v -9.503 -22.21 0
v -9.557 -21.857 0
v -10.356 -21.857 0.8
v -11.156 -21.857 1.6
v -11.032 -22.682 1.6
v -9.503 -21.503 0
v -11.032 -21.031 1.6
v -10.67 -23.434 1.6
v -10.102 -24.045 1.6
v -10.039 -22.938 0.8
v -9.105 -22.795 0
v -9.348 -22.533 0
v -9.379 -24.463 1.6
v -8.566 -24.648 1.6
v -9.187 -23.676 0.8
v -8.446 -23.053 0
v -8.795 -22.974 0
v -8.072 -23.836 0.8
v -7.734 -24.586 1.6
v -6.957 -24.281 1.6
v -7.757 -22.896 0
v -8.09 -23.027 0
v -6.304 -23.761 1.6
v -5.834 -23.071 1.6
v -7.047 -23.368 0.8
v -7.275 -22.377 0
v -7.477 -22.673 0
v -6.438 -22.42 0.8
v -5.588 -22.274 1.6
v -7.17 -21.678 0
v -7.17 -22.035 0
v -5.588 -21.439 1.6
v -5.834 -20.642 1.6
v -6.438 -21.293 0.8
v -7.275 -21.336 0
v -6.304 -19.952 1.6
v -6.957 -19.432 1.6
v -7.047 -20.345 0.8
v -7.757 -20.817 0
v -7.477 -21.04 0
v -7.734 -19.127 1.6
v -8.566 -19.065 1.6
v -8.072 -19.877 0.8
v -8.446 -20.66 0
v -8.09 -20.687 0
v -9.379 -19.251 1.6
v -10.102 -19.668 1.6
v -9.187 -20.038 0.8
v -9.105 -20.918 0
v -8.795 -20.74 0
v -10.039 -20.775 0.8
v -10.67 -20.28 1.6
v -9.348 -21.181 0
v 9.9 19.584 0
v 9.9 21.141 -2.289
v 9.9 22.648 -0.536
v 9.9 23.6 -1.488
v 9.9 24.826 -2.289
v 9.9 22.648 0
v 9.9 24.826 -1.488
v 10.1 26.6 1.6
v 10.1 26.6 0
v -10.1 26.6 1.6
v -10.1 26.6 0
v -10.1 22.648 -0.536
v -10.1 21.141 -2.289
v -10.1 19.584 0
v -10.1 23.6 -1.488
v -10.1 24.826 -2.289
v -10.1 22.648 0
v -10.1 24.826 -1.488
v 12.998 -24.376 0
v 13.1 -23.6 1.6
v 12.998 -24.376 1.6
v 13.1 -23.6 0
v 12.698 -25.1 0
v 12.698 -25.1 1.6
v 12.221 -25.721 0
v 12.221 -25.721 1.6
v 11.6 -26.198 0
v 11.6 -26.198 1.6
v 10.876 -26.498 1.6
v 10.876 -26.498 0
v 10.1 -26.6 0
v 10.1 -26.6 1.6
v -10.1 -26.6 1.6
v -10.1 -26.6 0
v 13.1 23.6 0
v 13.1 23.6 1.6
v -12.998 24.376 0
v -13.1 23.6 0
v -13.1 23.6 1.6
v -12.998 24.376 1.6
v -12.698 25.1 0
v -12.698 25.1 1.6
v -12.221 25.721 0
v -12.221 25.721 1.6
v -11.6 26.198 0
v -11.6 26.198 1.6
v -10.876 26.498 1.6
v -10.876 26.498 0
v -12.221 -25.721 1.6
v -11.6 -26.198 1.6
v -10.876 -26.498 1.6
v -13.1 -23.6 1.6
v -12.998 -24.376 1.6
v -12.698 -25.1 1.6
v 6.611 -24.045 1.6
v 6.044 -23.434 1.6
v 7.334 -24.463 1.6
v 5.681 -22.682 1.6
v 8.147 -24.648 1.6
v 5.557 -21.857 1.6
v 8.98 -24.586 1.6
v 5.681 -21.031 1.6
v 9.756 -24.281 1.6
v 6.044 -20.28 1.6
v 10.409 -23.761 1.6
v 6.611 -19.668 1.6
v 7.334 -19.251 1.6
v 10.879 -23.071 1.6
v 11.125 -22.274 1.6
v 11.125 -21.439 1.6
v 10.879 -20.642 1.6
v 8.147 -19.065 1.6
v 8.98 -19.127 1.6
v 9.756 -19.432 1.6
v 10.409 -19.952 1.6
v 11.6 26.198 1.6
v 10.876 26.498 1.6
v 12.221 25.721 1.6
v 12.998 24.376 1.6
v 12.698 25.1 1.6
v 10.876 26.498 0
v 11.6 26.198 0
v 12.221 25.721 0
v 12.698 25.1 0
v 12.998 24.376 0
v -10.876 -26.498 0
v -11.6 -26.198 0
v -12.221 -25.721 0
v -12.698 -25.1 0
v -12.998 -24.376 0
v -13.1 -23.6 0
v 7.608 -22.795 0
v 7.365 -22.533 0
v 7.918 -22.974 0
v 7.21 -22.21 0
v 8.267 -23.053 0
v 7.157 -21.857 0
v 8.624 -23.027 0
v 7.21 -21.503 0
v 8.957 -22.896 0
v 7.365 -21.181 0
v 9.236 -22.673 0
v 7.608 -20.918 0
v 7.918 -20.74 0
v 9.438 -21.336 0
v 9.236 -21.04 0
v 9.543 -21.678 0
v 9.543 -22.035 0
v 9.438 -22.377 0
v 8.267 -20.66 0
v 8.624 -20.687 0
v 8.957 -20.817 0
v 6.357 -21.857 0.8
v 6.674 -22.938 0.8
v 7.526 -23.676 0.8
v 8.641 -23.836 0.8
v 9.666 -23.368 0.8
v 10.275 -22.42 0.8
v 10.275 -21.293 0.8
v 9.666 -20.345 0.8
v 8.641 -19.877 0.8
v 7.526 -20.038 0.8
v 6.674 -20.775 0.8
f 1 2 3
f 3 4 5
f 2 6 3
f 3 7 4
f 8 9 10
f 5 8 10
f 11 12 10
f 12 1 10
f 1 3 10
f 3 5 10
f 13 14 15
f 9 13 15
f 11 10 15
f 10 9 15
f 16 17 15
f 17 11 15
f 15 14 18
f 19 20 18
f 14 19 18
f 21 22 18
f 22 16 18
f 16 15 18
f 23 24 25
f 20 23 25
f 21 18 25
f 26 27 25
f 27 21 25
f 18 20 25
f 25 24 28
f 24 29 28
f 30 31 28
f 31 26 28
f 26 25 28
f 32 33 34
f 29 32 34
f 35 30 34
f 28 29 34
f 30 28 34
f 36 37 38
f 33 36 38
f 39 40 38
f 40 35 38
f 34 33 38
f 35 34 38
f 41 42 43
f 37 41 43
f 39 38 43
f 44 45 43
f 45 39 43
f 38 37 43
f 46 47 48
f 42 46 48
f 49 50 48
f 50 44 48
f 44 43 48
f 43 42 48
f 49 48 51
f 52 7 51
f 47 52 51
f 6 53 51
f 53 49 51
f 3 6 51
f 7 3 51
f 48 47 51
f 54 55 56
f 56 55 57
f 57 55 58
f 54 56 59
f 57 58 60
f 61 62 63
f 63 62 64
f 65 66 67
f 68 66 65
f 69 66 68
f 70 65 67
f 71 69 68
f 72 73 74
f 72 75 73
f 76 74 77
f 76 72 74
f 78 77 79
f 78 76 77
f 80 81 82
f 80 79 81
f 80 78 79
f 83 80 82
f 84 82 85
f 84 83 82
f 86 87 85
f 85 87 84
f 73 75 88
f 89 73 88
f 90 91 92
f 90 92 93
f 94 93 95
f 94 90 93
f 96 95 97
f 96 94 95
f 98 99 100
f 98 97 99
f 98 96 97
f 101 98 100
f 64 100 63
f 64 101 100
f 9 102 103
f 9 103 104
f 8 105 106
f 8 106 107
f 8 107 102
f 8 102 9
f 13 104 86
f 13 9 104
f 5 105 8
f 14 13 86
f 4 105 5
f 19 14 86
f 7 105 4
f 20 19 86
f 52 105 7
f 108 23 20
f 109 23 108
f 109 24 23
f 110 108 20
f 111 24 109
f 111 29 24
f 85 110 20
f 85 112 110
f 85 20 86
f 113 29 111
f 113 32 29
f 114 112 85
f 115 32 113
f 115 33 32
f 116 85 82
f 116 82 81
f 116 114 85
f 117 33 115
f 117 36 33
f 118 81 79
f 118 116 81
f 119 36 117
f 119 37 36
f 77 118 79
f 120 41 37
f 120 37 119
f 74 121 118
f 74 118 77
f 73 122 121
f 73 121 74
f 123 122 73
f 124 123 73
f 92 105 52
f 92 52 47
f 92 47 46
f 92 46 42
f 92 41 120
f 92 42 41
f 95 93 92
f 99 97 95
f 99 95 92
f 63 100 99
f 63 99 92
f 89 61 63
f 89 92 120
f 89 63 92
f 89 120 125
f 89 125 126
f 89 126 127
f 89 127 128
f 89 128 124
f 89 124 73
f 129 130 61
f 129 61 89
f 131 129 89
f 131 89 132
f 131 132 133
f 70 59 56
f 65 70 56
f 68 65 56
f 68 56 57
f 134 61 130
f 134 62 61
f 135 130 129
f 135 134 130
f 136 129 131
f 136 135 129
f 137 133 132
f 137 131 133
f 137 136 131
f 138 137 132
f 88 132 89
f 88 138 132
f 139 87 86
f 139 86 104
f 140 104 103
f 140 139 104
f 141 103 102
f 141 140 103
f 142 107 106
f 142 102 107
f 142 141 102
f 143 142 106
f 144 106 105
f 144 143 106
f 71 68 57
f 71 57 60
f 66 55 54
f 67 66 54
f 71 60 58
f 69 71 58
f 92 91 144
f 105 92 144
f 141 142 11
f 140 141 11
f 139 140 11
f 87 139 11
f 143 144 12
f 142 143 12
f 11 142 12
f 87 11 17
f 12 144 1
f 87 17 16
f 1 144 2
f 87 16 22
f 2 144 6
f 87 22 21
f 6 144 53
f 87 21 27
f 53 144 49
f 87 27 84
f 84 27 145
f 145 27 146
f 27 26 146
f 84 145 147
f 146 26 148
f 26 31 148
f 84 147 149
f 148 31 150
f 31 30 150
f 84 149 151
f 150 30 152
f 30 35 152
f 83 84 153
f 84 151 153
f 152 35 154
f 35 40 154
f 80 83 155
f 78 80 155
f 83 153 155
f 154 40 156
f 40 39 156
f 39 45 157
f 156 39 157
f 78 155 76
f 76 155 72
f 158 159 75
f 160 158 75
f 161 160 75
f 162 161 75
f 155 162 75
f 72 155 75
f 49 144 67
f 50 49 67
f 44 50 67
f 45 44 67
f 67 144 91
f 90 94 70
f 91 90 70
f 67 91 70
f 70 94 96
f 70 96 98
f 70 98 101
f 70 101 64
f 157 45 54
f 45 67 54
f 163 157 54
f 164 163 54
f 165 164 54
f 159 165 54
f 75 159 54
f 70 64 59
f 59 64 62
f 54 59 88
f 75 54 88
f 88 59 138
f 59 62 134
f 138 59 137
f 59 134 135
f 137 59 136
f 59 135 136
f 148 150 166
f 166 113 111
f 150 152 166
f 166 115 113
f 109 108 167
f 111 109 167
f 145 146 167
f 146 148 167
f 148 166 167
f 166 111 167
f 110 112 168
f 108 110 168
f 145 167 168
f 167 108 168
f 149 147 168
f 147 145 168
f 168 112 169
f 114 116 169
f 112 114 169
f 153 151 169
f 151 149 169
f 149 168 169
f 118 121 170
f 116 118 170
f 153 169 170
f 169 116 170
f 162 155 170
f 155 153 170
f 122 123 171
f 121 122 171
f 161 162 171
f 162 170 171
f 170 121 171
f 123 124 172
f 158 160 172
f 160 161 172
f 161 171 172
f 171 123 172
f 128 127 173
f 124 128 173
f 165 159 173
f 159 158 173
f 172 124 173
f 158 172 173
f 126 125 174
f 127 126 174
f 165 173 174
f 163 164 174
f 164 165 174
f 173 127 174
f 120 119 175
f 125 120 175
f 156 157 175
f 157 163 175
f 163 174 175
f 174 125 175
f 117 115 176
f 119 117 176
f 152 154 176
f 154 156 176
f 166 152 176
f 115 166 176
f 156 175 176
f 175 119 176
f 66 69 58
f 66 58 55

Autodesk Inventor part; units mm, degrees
ref_plane "YZ Plane" through (0, 0, 0) normal (1, 0, 0) x (0, 1, 0)
ref_plane "XZ Plane" through (0, 0, 0) normal (0, 1, 0) x (-1, 0, 0)
sketch "Sketch1" plane through (0, 0, 0) normal (0, 0, 1) x (1, 0, 0)
  arc A0 (13.1, 23.6) -> (10.1, 26.6) centre (10.1, 23.6) ccw projected
  line L0 (10.1, 26.6) -> (-10.1, 26.6) projected
  arc A1 (-10.1, 26.6) -> (-13.1, 23.6) centre (-10.1, 23.6) ccw projected
  line L1 (-13.1, 23.6) -> (-13.1, -23.6) projected
  arc A2 (-13.1, -23.6) -> (-10.1, -26.6) centre (-10.1, -23.6) ccw projected
  line L2 (-10.1, -26.6) -> (10.1, -26.6) projected
  arc A3 (10.1, -26.6) -> (13.1, -23.6) centre (10.1, -23.6) ccw projected
  line L3 (13.1, -23.6) -> (13.1, 23.6) projected
  line L4 (11.5, 23) -> (11.5, -21.8566) projected
  line L5 (11.5, -21.8566) -> (11.5, -25) projected
  line L6 (11.5, -25) -> (8.3566, -25) projected
  line L7 (8.3566, -25) -> (-8.3566, -25) projected
  line L8 (-8.3566, -25) -> (-11.5, -25) projected
  line L9 (-11.5, -25) -> (-11.5, -21.8566) projected
  line L10 (-11.5, -21.8566) -> (-11.5, 23) projected
  line L11 (11.5, 23) -> (-11.5, 23) projected
  point P0 (0, 0)
extrude "Extrusion1" add sketch "Sketch1" along normal blind 1.6 contours L3 A3 L2 A2 L1 A1 L0 A0 | L4 L5 L6 L7 L8 L9 L10 L11
sketch "Sketch2" plane through (0, 0, 0) normal (0, 0, -1) x (-1, 0, 0)
  circle A0 centre (8.3566, -21.8566) radius 1.2 projected
  circle A1 centre (-8.3566, -21.8566) radius 1.2 projected
  point P0 (0, 0)
extrude "Extrusion2" cut sketch "Sketch2" against normal blind 1.6
chamfer "Chamfer1" distance 1.6 angle 45 2 edges at (9.5566, -21.8566, 1.6) (-7.1566, -21.8566, 1.6)
sketch "Sketch3" plane through (0, 0, 0) normal (0, 0, -1) x (-1, 0, 0)
  circle A0 centre (8.3566, -21.8566) radius 1.2 projected
  circle A1 centre (-8.3566, -21.8566) radius 1.2 projected
  arc A2 (-10.1, 26.6) -> (-13.1, 23.6) centre (-10.1, 23.6) ccw projected
  line L0 (-13.1, 23.6) -> (-13.1, -23.6) projected
  arc A3 (-13.1, -23.6) -> (-10.1, -26.6) centre (-10.1, -23.6) ccw projected
  line L1 (-10.1, -26.6) -> (10.1, -26.6) projected
  arc A4 (10.1, -26.6) -> (13.1, -23.6) centre (10.1, -23.6) ccw projected
  line L2 (13.1, -23.6) -> (13.1, 23.6) projected
  arc A5 (13.1, 23.6) -> (10.1, 26.6) centre (10.1, 23.6) ccw projected
  line L3 (10.1, 26.6) -> (-10.1, 26.6) projected
  point P0 (0, 0)
sketch "Sketch6" plane through (-13.1, -23.6, 1.6) normal (-1, 0, 0) x (0, 0, 1)
  line L0 (-1.6, 0) -> (-1.6, 47.2) projected
  line L1 (-1.6, 46.2477) -> (-2.136, 46.2477) projected
  line L2 (-2.136, 46.2477) -> (-3.0883, 47.2) projected
  line L3 (-3.0883, 47.2) -> (-3.0883, 48.4263) projected
  line L4 (-3.0883, 48.4263) -> (-3.8887, 48.4263) projected
  line L5 (-3.8887, 48.4263) -> (-3.8887, 44.7406) projected
  line L6 (-3.8887, 44.7406) -> (-1.6, 43.1845) projected
  line L7 (-1.6, 46.2477) -> (-1.6, 43.1845)
  point P0 (-1.6, 23.6)
  point P1 (-1.6, 1.7434)
extrude "Extrusion4" cut sketch "Sketch6" against normal blind 3
sketch "Sketch7" plane through (13.1, -23.6, 1.6) normal (1, 0, 0) x (0, 0, -1)
  line L0 (3.8887, 44.7406) -> (1.6, 43.1845) projected
  line L1 (3.8887, 48.4263) -> (3.8887, 44.7406) projected
  line L2 (3.0883, 48.4263) -> (3.8887, 48.4263) projected
  line L3 (3.0883, 47.2) -> (3.0883, 48.4263) projected
  line L4 (2.136, 46.2477) -> (3.0883, 47.2) projected
  line L5 (1.6, 46.2477) -> (2.136, 46.2477) projected
  line L6 (1.6, 46.2477) -> (1.6, 43.1845)
  point P0 (1.6, 23.6)
extrude "Extrusion5" cut sketch "Sketch7" against normal blind 3
ref_plane "Work Plane1" through (-10.1, -23.6, 0) normal (-1, 0, 0) x (0, 0, 1)
sketch "Sketch8" plane through (-10.1, -23.6, 0) normal (-1, 0, 0) x (0, 0, 1)
  line L0 (-0.536, 46.2477) -> (-1.4883, 47.2) projected
  line L1 (-1.4883, 47.2) -> (-1.4883, 48.4263) projected
  line L2 (-1.4883, 48.4263) -> (-2.2887, 48.4263) projected
  line L3 (-2.2887, 48.4263) -> (-2.2887, 44.7406) projected
  line L4 (-2.2887, 44.7406) -> (0, 43.1845) projected
  line L5 (0, 46.2477) -> (-0.536, 46.2477) projected
  line L6 (0, 0) -> (0, 47.2) projected
  point P0 (0, 23.6)
extrude "Extrusion6" add sketch "Sketch8" against normal blind 20
properties part number "top v3"
